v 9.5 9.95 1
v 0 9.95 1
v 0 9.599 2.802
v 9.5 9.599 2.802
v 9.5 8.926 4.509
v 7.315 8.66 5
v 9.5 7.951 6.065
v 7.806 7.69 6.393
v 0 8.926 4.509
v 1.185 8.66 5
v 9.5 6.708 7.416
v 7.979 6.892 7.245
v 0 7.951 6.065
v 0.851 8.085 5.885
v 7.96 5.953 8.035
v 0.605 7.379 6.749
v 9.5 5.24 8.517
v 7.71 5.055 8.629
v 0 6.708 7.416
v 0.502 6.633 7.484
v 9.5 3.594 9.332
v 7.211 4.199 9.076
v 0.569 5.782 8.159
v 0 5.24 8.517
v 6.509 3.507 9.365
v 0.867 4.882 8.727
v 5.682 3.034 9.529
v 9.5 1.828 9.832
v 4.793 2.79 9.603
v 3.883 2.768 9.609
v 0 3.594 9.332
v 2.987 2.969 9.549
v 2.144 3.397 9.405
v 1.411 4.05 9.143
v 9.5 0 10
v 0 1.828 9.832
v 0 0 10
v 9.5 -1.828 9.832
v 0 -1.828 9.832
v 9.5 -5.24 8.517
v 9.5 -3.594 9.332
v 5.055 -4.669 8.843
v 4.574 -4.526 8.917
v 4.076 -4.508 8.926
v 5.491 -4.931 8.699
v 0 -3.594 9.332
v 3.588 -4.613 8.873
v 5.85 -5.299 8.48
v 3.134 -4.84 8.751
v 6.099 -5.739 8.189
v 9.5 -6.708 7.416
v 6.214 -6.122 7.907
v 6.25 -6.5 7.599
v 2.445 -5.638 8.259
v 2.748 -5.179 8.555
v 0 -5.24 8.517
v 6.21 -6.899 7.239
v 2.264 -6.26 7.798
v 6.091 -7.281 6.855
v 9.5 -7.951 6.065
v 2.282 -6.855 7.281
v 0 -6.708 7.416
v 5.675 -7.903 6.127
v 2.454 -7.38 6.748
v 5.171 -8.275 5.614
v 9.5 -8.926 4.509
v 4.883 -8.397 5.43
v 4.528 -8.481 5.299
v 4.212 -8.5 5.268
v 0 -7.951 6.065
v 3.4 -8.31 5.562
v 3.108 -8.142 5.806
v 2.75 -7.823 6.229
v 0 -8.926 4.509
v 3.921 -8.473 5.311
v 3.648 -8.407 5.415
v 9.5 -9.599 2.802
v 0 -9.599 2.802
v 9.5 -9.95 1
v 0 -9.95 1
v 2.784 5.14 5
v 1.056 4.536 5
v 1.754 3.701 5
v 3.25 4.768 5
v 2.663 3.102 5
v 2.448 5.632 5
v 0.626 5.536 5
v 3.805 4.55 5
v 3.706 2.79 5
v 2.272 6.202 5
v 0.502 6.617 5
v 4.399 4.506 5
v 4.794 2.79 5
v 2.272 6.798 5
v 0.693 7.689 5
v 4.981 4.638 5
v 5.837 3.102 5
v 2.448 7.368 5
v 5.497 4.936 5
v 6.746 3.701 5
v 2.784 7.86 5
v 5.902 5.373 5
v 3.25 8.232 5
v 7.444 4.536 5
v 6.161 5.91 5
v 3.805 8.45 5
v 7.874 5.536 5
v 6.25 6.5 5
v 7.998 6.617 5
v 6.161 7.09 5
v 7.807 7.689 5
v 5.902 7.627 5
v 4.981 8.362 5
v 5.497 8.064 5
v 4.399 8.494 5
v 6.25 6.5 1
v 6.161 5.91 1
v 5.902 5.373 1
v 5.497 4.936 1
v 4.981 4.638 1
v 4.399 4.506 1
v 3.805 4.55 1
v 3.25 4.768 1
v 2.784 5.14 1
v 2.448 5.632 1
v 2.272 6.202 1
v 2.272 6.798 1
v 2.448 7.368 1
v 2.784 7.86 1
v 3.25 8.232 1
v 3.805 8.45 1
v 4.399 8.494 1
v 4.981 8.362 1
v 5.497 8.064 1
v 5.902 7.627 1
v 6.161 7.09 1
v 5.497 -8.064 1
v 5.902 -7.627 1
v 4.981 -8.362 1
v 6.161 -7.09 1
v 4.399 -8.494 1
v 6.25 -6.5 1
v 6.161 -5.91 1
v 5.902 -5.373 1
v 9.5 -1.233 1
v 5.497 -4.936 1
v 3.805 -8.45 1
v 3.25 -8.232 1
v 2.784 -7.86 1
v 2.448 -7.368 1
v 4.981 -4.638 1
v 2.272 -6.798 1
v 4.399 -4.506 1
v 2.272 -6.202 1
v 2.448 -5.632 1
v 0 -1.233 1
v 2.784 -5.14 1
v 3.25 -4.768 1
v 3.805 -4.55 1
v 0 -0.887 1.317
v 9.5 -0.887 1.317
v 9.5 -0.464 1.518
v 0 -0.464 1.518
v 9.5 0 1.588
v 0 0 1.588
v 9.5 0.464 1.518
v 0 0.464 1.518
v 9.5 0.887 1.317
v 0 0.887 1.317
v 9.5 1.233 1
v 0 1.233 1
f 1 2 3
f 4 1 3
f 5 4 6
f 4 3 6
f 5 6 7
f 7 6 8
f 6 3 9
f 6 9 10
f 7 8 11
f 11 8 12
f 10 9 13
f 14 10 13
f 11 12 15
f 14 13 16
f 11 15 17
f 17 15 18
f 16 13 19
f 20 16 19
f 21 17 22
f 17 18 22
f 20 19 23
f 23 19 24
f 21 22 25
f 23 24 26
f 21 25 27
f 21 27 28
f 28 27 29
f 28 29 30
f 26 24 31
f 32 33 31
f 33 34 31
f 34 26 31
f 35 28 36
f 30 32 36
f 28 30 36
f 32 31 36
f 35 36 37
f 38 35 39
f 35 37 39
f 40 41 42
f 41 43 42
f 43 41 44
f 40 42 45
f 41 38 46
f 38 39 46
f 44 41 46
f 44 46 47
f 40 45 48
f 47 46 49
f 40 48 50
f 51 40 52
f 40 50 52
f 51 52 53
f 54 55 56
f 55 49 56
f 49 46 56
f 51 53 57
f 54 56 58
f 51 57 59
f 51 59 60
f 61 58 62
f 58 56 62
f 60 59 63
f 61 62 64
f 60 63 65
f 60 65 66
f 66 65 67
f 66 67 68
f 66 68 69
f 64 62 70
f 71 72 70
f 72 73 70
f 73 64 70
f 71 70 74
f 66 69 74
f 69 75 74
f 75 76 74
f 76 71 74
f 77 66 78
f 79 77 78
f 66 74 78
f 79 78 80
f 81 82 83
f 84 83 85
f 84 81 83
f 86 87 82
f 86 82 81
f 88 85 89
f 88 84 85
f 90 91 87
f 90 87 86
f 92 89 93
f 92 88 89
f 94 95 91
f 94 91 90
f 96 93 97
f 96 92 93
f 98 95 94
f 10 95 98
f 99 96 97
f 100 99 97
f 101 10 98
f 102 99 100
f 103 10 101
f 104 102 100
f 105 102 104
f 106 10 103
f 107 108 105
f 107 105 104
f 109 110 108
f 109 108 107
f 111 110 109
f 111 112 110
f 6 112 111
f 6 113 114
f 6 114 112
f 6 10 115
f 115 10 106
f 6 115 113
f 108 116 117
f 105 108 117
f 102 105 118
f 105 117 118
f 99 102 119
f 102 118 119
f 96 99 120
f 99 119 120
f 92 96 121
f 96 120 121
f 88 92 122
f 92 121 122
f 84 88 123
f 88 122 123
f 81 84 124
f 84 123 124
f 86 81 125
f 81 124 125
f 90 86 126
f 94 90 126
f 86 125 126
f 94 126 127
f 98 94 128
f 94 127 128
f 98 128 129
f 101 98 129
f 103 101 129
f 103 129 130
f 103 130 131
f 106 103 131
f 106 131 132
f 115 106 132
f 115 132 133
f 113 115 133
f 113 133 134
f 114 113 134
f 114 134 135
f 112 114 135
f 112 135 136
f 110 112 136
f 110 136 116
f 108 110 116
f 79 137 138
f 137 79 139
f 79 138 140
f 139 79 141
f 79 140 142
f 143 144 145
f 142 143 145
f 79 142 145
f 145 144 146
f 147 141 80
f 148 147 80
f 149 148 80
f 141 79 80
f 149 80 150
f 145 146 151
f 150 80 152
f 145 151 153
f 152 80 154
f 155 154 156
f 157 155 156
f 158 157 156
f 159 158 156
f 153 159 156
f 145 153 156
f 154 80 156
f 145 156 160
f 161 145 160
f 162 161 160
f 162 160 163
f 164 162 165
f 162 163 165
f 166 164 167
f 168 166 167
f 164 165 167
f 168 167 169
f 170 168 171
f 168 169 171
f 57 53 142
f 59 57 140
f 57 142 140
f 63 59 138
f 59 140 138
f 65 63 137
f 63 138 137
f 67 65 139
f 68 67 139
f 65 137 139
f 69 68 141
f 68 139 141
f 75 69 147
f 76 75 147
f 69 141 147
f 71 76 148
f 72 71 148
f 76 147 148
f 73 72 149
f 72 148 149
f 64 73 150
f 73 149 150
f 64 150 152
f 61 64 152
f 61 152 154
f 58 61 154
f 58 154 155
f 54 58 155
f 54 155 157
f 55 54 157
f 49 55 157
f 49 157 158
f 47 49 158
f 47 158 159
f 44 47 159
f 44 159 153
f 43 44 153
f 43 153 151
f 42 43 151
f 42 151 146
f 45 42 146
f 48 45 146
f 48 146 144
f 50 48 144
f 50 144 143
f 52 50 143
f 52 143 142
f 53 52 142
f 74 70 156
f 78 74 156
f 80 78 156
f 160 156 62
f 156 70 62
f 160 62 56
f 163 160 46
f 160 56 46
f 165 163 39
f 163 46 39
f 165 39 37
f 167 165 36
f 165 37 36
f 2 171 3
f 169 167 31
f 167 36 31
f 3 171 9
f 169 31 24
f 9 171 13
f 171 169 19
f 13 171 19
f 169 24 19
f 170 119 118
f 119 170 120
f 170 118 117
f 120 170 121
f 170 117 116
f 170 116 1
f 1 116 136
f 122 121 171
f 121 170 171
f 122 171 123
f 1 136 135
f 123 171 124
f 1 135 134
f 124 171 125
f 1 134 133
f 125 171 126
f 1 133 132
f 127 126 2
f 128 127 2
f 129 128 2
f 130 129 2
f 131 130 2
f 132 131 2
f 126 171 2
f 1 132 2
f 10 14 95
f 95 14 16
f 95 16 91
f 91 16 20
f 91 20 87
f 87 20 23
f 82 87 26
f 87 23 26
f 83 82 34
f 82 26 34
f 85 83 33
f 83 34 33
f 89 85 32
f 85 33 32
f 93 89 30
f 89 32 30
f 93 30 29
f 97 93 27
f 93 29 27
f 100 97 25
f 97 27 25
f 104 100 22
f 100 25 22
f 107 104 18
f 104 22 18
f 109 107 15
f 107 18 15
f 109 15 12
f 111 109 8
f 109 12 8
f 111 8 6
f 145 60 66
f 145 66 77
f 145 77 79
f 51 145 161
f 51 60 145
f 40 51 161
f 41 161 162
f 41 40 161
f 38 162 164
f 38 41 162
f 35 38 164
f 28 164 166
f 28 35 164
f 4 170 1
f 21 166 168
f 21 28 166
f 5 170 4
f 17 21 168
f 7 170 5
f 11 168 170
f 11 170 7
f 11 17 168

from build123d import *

# Parameters (mm, degrees)
F1_DEPTH = 9.5
F2_R     = 2
F3_DEPTH = 9.001
F5_R     = 3.75
F6_DEPTH = 5


with BuildPart() as f1:
    # F0 (on Right) → F1 (new body)
    with BuildSketch(Plane.YZ):
        with BuildLine():
            Line((1.232946, 1), (9.949874, 1))
            ThreePointArc((9.949874, 1), (0, 10), (-9.949874, 1))
            Line((-9.949874, 1), (-1.232946, 1))
            ThreePointArc((-1.232946, 1), (0, 1.5875), (1.232946, 1))
        make_face()
    extrude(amount=F1_DEPTH)

    # F2 (on face) → F3 (cut, through all)
    with BuildSketch(Plane(origin=(0, 0, 1), x_dir=(1, 0, 0), z_dir=(0, 0, -1))):
        with Locations((4.25, 6.5)):
            Circle(F2_R)
        with Locations((4.25, -6.5)):
            Circle(F2_R)
    extrude(amount=-F3_DEPTH, mode=Mode.SUBTRACT)

    # F5 (on offset) → F6 (cut)
    with BuildSketch(Plane.XY.offset(10)):
        with Locations((4.25, 6.5)):
            Circle(F5_R)
    extrude(amount=-F6_DEPTH, mode=Mode.SUBTRACT)


solid = f1.part
